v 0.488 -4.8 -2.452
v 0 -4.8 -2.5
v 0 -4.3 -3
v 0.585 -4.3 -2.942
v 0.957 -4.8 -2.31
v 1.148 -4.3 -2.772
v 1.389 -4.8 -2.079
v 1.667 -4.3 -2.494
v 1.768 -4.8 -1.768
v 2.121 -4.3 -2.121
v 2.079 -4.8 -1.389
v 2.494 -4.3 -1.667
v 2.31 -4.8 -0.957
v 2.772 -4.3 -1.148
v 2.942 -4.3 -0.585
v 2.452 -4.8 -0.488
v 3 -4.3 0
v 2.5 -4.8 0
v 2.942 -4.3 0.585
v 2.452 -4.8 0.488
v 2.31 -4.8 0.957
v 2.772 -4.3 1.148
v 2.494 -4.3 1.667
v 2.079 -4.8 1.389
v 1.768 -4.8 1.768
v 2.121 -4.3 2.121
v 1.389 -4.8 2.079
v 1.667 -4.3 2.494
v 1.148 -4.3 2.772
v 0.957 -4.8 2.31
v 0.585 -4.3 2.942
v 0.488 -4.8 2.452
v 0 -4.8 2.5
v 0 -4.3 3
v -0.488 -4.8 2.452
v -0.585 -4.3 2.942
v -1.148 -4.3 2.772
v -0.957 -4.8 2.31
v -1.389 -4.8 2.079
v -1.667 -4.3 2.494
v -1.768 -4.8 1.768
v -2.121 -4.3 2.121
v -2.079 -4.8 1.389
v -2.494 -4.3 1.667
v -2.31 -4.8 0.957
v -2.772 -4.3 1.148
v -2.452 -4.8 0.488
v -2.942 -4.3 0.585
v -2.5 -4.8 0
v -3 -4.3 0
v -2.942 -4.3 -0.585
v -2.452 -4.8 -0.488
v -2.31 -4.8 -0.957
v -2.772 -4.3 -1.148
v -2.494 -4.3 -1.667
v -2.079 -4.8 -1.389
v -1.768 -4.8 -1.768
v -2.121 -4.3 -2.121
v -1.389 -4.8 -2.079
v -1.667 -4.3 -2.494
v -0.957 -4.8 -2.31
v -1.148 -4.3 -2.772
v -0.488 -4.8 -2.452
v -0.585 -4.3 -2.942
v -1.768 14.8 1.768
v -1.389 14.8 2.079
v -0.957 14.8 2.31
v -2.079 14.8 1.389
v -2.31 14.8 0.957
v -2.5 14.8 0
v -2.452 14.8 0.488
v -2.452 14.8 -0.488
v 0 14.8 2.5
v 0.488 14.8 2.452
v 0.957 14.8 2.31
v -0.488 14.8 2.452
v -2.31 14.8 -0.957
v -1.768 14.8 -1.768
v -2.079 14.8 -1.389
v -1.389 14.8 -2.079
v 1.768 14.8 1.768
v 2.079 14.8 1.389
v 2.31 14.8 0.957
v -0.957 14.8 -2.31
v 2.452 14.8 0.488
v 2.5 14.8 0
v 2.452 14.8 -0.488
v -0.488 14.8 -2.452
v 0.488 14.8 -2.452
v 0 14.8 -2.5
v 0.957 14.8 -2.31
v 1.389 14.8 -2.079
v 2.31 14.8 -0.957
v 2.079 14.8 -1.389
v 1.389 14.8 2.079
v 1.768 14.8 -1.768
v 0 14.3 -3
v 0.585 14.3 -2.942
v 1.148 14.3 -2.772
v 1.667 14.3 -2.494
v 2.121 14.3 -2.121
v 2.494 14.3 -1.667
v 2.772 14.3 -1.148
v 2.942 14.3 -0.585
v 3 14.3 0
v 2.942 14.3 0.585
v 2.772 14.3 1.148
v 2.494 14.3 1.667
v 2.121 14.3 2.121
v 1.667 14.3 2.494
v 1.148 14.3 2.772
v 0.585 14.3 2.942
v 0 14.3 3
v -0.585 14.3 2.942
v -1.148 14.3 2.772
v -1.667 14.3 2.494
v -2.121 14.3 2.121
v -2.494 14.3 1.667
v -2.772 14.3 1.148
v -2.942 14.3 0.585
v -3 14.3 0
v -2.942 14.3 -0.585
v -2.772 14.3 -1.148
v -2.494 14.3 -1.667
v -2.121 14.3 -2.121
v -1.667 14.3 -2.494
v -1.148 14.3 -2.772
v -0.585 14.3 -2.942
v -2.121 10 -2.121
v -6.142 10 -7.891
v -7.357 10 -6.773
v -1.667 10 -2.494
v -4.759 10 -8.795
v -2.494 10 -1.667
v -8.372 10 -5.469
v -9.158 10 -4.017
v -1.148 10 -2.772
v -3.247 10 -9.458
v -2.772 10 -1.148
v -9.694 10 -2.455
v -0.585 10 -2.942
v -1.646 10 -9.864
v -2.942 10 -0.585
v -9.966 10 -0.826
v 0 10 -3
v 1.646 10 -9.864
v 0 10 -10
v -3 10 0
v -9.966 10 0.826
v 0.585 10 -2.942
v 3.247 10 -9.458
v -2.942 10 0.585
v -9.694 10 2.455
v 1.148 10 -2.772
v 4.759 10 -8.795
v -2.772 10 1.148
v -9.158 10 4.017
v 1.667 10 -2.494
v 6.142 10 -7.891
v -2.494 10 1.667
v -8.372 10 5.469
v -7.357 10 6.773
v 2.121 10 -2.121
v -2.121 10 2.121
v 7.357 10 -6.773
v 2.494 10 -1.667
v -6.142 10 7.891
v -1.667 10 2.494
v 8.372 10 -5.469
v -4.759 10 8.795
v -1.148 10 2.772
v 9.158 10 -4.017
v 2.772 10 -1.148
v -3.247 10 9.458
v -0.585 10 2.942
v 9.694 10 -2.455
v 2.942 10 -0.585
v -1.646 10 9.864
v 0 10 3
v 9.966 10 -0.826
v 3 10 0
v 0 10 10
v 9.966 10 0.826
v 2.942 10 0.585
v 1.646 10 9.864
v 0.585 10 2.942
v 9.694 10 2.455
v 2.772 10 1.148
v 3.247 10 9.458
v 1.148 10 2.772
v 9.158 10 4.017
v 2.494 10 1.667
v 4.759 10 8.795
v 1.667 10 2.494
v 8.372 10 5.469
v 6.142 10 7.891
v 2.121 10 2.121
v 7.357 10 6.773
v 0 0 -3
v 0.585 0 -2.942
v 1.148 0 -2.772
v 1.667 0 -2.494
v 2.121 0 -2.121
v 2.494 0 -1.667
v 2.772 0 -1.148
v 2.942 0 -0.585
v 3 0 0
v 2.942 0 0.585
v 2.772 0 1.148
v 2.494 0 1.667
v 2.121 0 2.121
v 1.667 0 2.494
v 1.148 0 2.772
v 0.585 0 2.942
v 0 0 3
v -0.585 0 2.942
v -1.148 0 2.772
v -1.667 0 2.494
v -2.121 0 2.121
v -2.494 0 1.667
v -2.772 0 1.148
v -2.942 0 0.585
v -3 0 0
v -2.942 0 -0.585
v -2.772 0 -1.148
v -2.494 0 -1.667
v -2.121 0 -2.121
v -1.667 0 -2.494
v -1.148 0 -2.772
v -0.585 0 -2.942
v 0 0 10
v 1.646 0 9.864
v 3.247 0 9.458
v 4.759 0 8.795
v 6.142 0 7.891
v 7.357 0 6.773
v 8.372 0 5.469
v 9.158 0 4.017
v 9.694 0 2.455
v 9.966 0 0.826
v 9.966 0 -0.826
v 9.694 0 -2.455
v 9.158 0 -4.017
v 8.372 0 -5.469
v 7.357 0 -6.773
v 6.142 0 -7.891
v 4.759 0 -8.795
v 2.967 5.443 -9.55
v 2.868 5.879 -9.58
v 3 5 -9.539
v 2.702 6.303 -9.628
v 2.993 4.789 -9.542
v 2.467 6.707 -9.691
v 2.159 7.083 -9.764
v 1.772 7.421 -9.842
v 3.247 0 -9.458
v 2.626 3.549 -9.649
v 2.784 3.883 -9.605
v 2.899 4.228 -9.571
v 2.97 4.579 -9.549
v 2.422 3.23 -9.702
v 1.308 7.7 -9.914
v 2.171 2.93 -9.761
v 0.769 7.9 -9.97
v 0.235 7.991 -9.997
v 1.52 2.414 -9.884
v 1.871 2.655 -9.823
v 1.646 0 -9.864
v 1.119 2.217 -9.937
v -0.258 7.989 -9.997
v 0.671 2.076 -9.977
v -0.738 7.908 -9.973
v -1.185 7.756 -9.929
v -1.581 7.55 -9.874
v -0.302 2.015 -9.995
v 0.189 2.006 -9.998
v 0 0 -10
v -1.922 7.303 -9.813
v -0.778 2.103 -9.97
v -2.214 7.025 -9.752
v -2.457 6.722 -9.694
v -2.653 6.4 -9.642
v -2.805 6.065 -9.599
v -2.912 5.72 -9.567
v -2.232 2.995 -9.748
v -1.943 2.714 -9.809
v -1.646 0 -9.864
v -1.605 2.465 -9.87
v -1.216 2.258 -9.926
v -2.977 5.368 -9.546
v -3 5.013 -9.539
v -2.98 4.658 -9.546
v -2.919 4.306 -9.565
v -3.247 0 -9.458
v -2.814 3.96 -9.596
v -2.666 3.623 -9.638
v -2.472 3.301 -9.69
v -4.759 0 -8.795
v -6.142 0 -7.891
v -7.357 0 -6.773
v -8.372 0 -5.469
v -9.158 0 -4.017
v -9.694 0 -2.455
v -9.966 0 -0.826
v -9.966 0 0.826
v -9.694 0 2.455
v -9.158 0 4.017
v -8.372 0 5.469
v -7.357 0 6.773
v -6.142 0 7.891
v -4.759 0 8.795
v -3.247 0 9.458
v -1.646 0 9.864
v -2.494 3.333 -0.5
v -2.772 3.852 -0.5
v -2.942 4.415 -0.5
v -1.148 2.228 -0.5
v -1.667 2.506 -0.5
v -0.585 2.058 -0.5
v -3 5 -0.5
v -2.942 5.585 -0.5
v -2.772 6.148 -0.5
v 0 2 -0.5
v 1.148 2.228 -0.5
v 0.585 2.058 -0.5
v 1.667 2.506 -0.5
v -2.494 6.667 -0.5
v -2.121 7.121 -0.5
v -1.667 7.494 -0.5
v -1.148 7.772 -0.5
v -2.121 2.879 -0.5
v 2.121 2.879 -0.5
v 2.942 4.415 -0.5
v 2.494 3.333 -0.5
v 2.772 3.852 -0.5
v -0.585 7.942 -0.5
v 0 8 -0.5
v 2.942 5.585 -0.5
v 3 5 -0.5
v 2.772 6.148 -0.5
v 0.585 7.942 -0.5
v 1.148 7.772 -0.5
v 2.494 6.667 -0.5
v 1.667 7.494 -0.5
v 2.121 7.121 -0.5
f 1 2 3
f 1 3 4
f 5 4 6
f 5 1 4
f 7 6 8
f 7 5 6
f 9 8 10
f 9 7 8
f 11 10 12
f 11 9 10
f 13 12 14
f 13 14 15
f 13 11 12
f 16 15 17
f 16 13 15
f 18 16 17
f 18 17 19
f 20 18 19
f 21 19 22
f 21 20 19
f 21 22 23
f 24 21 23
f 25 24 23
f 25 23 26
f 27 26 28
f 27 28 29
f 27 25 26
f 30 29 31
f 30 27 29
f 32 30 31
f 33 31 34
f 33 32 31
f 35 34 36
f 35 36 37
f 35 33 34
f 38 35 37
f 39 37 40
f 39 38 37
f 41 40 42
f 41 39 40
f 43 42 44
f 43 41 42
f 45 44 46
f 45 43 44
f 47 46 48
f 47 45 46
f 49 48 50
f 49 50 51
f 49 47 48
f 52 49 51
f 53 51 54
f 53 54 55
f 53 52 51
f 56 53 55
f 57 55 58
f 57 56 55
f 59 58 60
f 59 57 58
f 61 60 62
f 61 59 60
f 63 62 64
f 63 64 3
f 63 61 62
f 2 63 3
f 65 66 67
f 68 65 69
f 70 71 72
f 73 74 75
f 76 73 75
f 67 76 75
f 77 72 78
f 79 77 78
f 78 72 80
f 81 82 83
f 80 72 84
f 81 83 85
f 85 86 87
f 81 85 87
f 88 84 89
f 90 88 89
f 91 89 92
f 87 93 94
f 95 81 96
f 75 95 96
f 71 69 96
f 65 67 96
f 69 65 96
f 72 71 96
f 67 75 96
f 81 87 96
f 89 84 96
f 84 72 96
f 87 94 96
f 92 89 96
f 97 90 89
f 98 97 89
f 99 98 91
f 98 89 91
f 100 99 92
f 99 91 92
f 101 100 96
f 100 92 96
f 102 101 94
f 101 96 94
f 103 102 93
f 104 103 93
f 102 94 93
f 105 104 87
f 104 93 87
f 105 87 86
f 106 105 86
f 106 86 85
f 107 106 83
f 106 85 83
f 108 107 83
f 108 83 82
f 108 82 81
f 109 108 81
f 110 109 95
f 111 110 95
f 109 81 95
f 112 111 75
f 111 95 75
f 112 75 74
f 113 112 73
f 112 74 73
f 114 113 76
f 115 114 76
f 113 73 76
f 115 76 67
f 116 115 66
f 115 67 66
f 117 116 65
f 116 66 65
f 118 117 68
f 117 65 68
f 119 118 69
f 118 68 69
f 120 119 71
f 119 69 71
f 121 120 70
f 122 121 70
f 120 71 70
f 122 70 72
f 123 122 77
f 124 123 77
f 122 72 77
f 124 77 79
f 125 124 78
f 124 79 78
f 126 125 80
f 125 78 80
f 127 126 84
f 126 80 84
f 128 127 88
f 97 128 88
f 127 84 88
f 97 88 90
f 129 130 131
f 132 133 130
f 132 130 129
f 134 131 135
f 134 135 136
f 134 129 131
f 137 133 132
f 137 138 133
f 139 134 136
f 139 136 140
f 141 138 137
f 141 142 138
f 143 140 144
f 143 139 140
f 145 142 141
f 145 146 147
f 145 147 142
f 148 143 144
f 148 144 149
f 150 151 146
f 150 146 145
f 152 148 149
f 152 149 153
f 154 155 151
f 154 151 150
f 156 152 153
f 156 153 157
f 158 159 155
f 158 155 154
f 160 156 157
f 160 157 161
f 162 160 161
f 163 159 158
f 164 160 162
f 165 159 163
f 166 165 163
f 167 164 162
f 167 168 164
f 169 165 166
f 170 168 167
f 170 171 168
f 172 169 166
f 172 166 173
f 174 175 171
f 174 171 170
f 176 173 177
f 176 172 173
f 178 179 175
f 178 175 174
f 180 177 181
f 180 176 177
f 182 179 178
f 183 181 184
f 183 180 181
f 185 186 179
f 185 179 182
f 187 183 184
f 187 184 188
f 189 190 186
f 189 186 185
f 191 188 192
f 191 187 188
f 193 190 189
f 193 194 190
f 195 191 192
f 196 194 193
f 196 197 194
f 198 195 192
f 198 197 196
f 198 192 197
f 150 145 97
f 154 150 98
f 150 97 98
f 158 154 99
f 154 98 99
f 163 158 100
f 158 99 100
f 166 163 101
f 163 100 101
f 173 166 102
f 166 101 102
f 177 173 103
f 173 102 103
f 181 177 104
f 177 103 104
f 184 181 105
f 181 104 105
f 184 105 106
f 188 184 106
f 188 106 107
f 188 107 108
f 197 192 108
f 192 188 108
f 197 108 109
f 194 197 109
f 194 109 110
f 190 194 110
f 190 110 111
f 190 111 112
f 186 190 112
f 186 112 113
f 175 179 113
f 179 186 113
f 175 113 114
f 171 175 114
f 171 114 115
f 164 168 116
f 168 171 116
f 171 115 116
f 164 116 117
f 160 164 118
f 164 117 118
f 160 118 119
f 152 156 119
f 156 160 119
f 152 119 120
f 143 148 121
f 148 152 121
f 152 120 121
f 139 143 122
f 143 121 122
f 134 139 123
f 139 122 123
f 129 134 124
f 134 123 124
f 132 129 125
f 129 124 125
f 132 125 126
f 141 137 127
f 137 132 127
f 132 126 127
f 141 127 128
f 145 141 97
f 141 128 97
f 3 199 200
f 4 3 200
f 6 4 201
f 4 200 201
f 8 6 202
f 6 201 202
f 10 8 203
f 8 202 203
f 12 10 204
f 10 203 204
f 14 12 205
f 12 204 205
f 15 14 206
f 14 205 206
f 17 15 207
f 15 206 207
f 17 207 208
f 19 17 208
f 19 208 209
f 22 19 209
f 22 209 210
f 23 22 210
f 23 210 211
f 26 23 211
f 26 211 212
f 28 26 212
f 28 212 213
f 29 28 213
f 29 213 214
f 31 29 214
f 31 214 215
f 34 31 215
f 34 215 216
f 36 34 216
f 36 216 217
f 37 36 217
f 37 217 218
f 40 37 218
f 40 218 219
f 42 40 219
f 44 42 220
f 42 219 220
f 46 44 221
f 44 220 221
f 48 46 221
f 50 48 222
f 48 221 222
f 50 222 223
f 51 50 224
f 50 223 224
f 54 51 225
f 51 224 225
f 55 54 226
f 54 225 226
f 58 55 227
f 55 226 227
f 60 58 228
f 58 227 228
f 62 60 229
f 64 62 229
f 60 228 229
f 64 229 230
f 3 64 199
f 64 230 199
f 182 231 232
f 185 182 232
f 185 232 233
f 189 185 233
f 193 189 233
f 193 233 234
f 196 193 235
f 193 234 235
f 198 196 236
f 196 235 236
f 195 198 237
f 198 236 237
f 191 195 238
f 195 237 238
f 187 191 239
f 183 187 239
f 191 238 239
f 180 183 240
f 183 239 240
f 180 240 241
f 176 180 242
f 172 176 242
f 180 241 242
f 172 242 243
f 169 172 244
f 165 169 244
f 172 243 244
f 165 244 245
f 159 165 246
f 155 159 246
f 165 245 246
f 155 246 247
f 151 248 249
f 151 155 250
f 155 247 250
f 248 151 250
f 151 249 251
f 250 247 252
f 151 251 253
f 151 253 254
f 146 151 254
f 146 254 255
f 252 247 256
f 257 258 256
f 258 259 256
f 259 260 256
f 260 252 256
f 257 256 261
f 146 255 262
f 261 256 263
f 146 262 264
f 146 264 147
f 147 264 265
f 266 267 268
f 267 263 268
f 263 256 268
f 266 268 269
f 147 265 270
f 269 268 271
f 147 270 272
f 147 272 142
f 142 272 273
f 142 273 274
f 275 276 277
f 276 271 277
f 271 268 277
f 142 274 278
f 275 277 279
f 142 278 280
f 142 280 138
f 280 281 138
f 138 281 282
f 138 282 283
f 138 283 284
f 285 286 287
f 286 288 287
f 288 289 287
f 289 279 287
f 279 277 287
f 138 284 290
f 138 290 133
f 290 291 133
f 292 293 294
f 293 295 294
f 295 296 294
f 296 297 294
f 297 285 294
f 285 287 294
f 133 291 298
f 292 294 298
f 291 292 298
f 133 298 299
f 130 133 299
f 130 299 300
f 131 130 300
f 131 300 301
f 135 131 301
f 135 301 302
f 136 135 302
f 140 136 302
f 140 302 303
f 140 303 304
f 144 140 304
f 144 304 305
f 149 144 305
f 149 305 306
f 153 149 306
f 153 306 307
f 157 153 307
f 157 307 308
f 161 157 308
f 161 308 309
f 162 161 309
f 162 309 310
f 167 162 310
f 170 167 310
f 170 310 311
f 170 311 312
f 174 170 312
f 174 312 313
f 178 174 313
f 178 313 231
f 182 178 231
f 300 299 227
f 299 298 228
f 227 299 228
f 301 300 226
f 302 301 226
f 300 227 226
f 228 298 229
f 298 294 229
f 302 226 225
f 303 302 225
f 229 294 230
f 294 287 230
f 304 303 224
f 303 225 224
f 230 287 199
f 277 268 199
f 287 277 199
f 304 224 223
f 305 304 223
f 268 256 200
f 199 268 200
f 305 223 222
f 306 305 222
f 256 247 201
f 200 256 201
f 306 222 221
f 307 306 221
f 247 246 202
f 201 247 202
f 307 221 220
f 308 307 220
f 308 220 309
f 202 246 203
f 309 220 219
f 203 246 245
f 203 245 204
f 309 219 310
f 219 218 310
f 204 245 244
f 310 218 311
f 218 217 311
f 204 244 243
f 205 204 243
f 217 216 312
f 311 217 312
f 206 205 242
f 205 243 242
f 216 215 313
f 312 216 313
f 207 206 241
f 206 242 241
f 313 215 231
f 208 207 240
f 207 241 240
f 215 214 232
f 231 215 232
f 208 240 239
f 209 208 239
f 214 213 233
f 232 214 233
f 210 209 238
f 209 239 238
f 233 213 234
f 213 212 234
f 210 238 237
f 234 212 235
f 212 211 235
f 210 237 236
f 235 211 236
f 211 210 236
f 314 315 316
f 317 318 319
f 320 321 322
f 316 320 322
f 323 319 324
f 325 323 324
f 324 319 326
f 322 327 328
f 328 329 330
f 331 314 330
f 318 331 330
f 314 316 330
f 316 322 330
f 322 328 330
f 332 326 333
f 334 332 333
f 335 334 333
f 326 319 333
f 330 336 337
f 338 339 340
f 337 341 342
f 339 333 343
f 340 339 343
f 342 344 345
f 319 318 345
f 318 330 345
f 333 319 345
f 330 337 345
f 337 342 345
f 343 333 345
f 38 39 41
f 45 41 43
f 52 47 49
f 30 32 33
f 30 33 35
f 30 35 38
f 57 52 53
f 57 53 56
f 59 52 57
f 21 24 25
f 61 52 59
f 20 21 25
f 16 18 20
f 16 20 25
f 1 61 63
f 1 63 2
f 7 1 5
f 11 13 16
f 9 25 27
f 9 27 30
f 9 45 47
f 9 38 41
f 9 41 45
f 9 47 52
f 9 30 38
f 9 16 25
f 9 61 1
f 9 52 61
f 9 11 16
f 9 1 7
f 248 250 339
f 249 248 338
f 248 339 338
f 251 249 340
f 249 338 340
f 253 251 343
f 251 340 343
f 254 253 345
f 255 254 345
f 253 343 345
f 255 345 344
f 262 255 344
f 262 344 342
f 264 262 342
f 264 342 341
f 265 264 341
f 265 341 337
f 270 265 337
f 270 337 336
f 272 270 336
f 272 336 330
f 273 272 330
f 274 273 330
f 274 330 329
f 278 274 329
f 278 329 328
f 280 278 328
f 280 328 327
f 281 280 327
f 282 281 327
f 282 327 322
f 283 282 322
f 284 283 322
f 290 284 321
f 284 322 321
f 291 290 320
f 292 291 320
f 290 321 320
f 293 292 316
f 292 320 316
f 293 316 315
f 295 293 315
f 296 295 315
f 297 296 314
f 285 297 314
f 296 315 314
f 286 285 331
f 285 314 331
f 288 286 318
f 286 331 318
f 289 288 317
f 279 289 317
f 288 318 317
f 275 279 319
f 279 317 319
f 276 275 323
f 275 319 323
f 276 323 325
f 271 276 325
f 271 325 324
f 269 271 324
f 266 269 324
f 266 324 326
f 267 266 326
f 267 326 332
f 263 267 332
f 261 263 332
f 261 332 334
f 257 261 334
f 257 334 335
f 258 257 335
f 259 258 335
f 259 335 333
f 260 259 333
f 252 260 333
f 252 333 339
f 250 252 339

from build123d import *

# Parameters (mm, degrees)
SCHIZZO1_R                   = 10
ESTRUSIONE_ESTRUSIONE1_DEPTH = 10
ESTRUSIONE_ESTRUSIONE2_START = -14.8
SCHIZZO2_R                   = 3
ESTRUSIONE_ESTRUSIONE2_DEPTH = 19.6
TAGLIO_ESTRUSIONE1_START     = -0.5
SCHIZZO3_R                   = 3
TAGLIO_ESTRUSIONE1_DEPTH     = 9.5
SMUSSO1_SIZE                 = 0.5


with BuildPart() as part:
    # Schizzo1 → Estrusione-Estrusione1 (new body)
    with BuildSketch(Plane(origin=(0, 0, 0), x_dir=(1, 0, 0), z_dir=(0, 1, 0))):
        with Locations(Location((0, 0, 0), (0, 0, 270))):
            Circle(SCHIZZO1_R)
    extrude(amount=ESTRUSIONE_ESTRUSIONE1_DEPTH)

    # Schizzo2 → Estrusione-Estrusione2 (add)
    with BuildSketch(Plane.XZ.offset(ESTRUSIONE_ESTRUSIONE2_START)):
        with Locations(Location((0, 0, 0), (0, 0, 270))):
            Circle(SCHIZZO2_R)
    extrude(amount=ESTRUSIONE_ESTRUSIONE2_DEPTH)

    # Schizzo3 → Taglio-Estrusione1 (cut)
    with BuildSketch(Plane.XY.offset(TAGLIO_ESTRUSIONE1_START)):
        with Locations((0, 5)):
            Circle(SCHIZZO3_R)
    extrude(amount=-TAGLIO_ESTRUSIONE1_DEPTH, mode=Mode.SUBTRACT)

    # Smusso1
    smusso1_edges = [part.edges().sort_by_distance(p)[0] for p in [
        (0, -4.8, 3),
        (0, 14.8, 3),
    ]]
    chamfer(smusso1_edges, length=SMUSSO1_SIZE)


solid = part.part
